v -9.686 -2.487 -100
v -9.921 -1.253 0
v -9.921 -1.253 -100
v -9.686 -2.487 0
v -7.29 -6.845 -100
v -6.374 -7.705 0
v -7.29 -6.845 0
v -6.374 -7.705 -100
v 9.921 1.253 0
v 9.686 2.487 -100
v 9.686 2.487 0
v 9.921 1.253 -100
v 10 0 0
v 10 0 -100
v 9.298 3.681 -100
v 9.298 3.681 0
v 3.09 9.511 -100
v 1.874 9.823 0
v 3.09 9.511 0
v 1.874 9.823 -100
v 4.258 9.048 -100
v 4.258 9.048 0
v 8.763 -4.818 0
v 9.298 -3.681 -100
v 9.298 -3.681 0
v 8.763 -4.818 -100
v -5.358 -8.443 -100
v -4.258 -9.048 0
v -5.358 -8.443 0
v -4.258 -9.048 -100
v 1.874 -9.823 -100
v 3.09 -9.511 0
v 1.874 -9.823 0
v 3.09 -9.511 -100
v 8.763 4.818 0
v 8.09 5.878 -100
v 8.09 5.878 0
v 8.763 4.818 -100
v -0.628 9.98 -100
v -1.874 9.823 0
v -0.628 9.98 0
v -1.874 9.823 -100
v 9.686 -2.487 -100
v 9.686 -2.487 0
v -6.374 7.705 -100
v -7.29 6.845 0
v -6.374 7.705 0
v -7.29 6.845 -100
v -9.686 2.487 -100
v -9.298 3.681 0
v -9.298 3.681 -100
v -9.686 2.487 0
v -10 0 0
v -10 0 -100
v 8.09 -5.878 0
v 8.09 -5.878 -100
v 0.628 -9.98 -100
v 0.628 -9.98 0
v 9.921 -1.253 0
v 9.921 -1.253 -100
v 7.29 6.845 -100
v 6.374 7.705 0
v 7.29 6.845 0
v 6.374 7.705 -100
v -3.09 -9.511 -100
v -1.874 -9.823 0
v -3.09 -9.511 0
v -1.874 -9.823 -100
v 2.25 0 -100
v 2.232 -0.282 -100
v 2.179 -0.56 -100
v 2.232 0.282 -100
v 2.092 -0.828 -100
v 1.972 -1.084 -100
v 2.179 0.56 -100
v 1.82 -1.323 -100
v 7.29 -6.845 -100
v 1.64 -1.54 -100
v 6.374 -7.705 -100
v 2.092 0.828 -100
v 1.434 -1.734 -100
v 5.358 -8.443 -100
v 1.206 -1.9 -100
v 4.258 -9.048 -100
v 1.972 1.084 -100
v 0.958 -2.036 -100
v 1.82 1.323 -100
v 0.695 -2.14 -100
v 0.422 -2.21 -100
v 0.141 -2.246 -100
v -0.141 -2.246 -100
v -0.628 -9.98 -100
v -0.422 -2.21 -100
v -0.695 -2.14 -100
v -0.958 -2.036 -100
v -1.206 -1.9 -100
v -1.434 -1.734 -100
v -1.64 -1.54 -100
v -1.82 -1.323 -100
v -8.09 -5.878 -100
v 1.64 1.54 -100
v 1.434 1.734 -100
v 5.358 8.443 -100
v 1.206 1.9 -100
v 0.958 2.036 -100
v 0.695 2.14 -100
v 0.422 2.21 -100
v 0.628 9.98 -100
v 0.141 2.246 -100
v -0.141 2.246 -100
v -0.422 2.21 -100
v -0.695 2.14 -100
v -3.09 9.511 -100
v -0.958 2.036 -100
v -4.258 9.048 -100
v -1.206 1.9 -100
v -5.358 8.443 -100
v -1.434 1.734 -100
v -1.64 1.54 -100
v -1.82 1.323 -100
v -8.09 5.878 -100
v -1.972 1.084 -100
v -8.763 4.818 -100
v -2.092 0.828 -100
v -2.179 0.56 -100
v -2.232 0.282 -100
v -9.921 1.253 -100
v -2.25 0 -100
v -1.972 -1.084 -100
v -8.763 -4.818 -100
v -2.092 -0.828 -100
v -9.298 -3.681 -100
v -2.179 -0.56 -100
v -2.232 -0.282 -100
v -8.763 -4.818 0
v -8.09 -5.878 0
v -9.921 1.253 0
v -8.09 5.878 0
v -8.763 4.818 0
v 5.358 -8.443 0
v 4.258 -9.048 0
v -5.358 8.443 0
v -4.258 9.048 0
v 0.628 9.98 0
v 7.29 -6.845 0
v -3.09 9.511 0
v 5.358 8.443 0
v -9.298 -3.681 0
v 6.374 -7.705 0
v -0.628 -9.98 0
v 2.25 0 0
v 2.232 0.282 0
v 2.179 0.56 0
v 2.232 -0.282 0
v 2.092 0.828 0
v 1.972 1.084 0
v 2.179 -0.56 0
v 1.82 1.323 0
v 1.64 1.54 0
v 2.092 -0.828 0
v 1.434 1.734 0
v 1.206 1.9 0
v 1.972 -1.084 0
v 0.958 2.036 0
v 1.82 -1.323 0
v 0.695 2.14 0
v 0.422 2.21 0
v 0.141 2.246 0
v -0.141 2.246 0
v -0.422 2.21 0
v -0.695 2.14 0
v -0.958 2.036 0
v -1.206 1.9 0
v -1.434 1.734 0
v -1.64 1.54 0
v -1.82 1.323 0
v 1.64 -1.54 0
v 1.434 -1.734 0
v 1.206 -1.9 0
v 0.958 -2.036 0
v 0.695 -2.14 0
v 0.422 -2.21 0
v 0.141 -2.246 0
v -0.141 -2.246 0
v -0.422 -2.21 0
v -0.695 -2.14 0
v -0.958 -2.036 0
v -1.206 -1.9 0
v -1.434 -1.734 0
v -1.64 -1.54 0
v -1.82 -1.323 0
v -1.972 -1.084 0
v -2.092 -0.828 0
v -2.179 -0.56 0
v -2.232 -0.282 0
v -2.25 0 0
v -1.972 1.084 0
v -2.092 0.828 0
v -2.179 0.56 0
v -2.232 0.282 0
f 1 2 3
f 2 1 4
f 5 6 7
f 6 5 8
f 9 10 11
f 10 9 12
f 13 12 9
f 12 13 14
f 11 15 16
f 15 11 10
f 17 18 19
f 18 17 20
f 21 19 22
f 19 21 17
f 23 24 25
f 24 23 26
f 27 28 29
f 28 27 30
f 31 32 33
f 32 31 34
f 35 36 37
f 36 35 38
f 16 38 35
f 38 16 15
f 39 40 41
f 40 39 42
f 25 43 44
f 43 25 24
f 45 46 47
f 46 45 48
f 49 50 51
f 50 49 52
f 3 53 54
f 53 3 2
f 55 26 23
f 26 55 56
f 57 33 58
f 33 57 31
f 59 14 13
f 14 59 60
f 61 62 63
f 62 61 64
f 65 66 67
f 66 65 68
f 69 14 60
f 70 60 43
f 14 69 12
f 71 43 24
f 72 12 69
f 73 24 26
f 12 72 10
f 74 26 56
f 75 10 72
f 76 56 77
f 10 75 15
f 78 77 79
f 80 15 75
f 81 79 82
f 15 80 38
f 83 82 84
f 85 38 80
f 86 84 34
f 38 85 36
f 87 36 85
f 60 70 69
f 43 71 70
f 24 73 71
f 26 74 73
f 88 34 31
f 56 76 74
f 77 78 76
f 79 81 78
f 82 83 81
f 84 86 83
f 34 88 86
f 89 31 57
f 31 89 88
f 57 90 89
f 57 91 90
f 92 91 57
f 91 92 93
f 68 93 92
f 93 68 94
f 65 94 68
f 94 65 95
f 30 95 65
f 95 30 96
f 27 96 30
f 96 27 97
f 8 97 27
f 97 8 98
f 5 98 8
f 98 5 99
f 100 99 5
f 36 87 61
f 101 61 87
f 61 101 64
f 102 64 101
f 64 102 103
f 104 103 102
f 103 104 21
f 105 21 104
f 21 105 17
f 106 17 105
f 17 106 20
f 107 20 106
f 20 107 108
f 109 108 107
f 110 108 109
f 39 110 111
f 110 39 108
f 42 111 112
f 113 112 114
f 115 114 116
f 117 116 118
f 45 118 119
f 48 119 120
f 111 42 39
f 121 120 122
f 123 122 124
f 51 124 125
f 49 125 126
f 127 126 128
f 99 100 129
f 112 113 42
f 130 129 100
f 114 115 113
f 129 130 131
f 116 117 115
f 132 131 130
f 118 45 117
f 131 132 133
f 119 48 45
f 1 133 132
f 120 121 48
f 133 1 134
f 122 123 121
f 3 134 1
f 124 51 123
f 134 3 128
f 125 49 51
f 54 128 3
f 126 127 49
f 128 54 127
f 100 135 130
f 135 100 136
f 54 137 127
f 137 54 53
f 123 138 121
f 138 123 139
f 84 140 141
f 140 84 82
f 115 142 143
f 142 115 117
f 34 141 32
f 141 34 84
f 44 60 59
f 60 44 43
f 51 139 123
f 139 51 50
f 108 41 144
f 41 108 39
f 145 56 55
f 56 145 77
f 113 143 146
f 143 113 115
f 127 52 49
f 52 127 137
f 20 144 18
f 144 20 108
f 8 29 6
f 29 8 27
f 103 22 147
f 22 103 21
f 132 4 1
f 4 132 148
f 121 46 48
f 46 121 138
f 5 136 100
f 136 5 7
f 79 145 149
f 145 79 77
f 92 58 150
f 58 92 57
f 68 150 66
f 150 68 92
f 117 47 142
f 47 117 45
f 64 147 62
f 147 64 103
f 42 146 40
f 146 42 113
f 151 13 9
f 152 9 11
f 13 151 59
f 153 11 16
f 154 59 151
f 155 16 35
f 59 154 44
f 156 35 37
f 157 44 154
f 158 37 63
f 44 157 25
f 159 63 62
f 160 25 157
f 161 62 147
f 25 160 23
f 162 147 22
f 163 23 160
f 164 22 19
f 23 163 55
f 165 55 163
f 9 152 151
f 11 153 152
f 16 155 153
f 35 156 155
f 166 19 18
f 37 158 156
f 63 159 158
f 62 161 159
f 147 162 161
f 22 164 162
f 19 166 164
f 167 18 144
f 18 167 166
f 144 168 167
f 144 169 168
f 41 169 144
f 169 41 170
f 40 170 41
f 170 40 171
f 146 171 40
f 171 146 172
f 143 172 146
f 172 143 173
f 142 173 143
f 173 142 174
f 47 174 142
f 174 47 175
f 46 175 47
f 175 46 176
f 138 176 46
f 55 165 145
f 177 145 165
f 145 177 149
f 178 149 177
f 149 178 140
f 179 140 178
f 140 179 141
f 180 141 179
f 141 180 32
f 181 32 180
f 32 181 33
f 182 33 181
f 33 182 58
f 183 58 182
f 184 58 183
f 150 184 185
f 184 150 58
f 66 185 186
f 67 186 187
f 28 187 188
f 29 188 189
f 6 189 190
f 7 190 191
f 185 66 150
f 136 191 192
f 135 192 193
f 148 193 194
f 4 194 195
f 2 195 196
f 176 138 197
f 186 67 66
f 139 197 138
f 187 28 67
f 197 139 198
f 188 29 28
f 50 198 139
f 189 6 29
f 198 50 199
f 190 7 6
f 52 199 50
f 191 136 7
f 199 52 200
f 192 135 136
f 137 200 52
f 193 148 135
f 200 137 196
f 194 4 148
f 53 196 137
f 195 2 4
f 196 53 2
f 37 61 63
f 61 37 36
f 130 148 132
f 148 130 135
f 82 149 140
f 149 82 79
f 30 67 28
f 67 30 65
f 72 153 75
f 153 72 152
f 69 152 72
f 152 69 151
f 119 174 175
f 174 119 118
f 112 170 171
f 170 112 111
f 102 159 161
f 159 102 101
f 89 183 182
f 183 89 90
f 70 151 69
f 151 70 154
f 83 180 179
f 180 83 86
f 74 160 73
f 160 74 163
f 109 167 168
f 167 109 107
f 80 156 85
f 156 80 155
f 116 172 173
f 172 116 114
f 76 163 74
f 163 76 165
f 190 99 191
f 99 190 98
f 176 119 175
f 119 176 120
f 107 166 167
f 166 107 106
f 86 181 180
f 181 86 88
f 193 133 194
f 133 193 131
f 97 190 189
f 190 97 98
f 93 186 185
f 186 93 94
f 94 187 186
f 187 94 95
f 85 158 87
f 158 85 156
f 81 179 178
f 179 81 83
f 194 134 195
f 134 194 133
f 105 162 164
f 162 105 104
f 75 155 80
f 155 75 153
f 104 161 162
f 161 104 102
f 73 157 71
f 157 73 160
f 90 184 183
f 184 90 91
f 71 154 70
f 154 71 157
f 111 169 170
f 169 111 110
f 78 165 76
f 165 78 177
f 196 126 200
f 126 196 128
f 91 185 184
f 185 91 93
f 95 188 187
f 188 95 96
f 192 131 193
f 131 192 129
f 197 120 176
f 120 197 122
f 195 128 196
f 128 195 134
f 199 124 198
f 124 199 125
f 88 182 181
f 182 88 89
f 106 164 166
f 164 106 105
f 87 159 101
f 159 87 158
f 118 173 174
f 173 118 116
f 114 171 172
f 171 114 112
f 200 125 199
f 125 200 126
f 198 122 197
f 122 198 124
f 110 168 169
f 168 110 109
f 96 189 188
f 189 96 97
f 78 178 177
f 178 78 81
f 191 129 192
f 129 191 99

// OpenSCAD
$fn = 50;


difference() {
	union() {
		translate(v = [0, 0, -100.0000000000]) {
			cylinder(h = 100, r = 10.0000000000);
		}
		cylinder(h = 0, r = 20.0000000000);
	}
	union() {
		#translate(v = [0, 0, -100]) {
			cylinder(h = 100, r = 2.2500000000);
		}
	}
}
